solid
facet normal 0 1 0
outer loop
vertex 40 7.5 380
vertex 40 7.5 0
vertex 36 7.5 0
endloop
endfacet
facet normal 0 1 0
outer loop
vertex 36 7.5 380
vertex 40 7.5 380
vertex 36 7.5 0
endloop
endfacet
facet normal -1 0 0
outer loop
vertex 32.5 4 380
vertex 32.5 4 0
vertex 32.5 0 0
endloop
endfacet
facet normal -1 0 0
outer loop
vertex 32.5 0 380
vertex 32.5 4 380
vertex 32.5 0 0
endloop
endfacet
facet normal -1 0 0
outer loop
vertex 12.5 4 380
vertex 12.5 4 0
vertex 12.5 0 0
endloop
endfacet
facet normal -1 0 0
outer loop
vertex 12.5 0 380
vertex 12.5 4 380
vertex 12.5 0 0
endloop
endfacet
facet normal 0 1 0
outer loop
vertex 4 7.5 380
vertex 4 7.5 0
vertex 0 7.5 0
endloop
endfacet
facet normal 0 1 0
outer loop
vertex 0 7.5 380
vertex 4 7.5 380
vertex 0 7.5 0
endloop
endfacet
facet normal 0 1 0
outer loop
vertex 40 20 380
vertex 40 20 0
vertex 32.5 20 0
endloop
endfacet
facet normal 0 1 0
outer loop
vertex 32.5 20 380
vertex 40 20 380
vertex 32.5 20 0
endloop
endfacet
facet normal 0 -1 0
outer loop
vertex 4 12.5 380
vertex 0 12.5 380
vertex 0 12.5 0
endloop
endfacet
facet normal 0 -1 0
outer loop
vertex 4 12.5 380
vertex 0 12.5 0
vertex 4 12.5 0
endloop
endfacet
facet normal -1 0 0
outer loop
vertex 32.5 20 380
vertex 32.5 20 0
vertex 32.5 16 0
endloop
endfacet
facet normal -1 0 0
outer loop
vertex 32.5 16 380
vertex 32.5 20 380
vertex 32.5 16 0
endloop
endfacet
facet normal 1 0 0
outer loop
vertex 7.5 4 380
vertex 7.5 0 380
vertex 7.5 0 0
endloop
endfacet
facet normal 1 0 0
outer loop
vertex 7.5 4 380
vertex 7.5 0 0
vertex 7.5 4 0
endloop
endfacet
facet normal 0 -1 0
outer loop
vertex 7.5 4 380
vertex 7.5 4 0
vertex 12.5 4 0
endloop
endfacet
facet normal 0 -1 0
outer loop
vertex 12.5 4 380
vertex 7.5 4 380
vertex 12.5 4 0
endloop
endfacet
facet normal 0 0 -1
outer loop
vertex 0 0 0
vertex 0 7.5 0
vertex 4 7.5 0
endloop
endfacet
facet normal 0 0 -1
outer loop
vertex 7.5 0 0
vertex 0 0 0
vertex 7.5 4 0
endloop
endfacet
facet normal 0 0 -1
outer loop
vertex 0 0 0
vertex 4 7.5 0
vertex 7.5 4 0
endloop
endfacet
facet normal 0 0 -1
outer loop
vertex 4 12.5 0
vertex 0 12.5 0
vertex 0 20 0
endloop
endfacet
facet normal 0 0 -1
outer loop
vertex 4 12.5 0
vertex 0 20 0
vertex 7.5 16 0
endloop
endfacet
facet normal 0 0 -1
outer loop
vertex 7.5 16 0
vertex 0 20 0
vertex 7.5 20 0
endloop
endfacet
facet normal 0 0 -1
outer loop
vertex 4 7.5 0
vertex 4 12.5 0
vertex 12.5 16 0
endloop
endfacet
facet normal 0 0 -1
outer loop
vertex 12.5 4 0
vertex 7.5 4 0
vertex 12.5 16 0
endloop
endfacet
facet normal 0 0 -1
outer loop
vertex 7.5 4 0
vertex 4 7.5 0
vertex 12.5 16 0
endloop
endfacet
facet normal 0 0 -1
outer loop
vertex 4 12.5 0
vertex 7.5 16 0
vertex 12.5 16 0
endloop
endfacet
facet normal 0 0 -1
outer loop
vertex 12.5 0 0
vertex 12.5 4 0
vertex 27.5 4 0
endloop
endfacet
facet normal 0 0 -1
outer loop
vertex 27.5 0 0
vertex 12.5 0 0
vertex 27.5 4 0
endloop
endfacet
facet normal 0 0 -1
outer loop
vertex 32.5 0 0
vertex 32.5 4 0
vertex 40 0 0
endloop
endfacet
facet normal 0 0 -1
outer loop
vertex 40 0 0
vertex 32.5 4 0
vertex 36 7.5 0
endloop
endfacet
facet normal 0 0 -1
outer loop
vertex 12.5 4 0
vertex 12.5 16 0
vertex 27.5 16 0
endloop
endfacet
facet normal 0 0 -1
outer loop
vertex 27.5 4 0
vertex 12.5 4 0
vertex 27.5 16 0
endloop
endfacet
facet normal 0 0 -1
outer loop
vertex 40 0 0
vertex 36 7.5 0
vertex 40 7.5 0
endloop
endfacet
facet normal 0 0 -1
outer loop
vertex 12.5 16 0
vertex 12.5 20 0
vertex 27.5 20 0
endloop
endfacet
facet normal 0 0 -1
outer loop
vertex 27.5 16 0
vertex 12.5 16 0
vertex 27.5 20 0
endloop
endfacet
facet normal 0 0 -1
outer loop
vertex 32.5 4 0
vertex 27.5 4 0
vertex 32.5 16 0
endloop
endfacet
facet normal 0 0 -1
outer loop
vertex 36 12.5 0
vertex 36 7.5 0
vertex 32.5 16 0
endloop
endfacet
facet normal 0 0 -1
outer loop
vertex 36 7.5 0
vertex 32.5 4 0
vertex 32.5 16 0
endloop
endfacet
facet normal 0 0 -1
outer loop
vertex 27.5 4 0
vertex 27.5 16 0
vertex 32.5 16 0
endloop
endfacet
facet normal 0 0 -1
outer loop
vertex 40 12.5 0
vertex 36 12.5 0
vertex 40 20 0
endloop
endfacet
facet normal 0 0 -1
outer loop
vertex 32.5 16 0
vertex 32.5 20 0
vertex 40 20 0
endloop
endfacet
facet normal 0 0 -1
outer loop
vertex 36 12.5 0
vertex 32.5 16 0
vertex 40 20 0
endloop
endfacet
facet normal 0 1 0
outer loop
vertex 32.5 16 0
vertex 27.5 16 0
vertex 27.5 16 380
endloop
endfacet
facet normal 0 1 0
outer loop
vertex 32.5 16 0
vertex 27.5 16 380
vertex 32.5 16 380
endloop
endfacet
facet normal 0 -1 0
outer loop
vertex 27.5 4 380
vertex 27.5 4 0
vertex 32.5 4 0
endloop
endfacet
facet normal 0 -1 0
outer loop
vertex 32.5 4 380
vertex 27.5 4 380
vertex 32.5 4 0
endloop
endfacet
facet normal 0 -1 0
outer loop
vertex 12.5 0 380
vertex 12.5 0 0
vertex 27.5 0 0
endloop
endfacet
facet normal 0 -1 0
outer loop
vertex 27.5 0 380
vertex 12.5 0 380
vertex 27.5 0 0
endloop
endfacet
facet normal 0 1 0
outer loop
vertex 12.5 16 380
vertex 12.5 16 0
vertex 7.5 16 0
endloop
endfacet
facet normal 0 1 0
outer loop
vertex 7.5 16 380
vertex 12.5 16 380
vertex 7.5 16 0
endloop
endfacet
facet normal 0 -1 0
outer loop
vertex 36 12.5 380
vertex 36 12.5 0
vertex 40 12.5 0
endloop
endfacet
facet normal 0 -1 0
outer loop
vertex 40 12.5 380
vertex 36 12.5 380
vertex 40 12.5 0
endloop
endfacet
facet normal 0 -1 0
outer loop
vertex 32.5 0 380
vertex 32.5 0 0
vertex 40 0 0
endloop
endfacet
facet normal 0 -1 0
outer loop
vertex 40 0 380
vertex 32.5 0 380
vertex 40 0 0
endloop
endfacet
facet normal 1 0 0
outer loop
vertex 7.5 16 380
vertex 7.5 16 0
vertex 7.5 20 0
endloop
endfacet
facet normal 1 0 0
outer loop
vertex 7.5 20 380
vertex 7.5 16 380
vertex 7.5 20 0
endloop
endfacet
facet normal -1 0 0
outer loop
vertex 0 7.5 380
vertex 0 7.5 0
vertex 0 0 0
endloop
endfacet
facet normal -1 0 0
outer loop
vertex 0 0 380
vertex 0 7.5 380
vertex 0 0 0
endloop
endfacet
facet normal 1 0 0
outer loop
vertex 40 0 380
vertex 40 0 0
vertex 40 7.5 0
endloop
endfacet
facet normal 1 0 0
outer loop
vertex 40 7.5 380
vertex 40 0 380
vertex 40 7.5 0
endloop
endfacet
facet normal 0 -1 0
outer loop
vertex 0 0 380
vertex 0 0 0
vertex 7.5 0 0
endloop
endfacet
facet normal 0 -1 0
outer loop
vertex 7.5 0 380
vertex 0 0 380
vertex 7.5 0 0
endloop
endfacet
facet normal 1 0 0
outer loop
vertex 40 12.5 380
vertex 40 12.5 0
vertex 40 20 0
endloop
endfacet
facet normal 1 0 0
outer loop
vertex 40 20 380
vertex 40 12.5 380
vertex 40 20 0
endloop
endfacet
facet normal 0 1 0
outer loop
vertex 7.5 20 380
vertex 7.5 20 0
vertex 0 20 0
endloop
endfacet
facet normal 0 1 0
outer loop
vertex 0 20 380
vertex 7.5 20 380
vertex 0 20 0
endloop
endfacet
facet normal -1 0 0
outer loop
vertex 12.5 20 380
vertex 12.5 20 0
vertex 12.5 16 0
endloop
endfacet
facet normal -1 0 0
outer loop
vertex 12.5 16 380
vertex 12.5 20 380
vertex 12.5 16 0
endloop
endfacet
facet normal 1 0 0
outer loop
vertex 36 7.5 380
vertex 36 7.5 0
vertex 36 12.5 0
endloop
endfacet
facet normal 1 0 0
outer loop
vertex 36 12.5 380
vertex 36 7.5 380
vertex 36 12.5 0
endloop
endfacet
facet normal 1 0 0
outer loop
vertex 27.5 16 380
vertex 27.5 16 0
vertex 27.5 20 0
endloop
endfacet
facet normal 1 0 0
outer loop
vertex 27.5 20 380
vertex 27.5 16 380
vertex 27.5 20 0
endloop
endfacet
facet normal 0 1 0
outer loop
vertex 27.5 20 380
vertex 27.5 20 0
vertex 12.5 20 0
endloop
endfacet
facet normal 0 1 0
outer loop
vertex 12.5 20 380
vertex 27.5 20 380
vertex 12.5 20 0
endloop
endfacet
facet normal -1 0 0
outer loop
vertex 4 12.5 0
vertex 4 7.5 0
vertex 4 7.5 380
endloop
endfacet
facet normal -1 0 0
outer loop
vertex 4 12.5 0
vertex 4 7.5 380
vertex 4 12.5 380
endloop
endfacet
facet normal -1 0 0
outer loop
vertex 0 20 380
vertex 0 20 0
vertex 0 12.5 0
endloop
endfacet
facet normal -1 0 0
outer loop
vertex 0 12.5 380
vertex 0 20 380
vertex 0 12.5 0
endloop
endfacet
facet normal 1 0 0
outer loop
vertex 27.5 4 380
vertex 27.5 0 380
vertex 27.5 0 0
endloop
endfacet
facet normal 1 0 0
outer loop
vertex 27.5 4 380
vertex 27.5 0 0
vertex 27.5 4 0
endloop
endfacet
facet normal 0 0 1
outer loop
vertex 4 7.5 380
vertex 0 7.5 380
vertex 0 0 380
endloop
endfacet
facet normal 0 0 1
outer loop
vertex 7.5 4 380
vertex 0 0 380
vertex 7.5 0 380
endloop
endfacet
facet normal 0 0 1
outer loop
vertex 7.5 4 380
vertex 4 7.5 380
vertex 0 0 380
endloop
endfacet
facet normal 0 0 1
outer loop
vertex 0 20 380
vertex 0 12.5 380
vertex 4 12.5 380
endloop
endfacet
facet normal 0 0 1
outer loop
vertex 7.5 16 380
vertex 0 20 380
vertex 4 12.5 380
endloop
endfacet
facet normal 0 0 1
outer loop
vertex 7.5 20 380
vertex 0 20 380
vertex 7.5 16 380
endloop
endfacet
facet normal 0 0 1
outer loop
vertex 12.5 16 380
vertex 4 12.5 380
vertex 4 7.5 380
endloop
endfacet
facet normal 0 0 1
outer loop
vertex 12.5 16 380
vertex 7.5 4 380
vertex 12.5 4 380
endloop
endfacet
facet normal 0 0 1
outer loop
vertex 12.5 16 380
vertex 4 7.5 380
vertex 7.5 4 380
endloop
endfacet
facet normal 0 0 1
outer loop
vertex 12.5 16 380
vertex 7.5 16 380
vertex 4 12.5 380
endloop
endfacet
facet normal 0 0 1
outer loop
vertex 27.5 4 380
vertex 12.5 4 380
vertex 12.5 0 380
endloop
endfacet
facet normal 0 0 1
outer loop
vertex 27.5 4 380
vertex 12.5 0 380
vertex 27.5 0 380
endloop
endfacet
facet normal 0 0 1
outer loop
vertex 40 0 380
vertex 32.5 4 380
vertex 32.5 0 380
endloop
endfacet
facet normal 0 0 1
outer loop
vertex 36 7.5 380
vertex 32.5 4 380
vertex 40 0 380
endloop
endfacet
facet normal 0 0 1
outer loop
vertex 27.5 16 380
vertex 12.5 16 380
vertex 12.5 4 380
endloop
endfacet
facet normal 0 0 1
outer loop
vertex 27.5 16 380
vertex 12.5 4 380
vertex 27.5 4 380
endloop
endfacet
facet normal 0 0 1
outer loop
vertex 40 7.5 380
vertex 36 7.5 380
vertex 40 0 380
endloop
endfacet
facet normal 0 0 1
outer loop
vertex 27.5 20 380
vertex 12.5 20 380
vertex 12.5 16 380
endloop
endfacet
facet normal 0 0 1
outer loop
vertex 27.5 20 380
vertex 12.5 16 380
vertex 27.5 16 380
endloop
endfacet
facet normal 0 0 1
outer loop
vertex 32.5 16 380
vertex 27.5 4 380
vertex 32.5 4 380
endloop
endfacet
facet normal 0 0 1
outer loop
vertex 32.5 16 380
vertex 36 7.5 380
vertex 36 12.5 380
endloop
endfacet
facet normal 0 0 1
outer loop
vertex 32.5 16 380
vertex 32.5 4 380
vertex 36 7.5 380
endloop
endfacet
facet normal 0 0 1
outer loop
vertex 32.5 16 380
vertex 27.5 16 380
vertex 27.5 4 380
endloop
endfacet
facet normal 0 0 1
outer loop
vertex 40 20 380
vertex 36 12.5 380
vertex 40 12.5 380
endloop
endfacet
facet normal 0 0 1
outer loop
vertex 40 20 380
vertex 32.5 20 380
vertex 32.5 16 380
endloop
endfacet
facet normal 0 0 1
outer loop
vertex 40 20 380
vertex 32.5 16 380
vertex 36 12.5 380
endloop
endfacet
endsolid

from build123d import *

# Parameters (mm, degrees)
ESQUISSE1_W        = 3.5
ESQUISSE1_H        = 5
ESQUISSE1_W_2      = 5
ESQUISSE1_H_2      = 3.5
ESQUISSE1_W_3      = 4
BOSS_EXTRU_1_DEPTH = 380


with BuildPart() as part:
    # Esquisse1 → Boss.-Extru.1 (new body)
    with BuildSketch(Plane.XY):
        Polygon((7.5, 16), (7.5, 20), (0, 20), (4, 16), align=None)
        Polygon((4, 16), (0, 20), (0, 12.5), (4, 12.5), align=None)
        Polygon((4, 7.5), (0, 7.5), (0, 0), (4, 4), align=None)
        Polygon((0, 0), (7.5, 0), (7.5, 4), (4, 4), align=None)
        Polygon((4, 4), (7.5, 7.5), (4, 7.5), align=None)
        Polygon((7.5, 4), (7.5, 7.5), (4, 4), align=None)
        Polygon((4, 12.5), (7.5, 12.5), (4, 16), align=None)
        Polygon((7.5, 12.5), (7.5, 16), (4, 16), align=None)
        with Locations((5.75, 10)):
            Rectangle(ESQUISSE1_W, ESQUISSE1_H)
        Polygon((7.5, 7.5), (10, 10), (7.5, 12.5), align=None)
        Polygon((10, 10), (12.5, 12.5), (7.5, 12.5), align=None)
        Polygon((12.5, 7.5), (12.5, 12.5), (10, 10), align=None)
        Polygon((12.5, 7.5), (10, 10), (7.5, 7.5), align=None)
        Polygon((16, 4), (12.5, 7.5), (12.5, 4), align=None)
        Polygon((16, 4), (16, 7.5), (12.5, 7.5), align=None)
        Polygon((20, 0), (20, 7.5), (16, 7.5), (16, 4), align=None)
        with Locations((10, 14.25)):
            Rectangle(ESQUISSE1_W_2, ESQUISSE1_H_2)
        with Locations((14.25, 10)):
            Rectangle(ESQUISSE1_W, ESQUISSE1_H)
        Polygon((12.5, 12.5), (16, 16), (12.5, 16), align=None)
        Polygon((16, 16), (20, 20), (12.5, 20), (12.5, 16), align=None)
        Polygon((16, 12.5), (16, 16), (12.5, 12.5), align=None)
        Polygon((20, 12.5), (20, 20), (16, 16), (16, 12.5), align=None)
        Polygon((12.5, 0), (20, 0), (16, 4), (12.5, 4), align=None)
        with Locations((10, 5.75)):
            Rectangle(ESQUISSE1_W_2, ESQUISSE1_H_2)
        with Locations((18, 10)):
            Rectangle(ESQUISSE1_W_3, ESQUISSE1_H)
        with Locations((22, 10)):
            Rectangle(ESQUISSE1_W_3, ESQUISSE1_H)
        Polygon((24, 16), (20, 20), (20, 12.5), (24, 12.5), align=None)
        Polygon((27.5, 20), (20, 20), (24, 16), (27.5, 16), align=None)
        Polygon((27.5, 12.5), (24, 16), (24, 12.5), align=None)
        Polygon((27.5, 16), (24, 16), (27.5, 12.5), align=None)
        with Locations((25.75, 10)):
            Rectangle(ESQUISSE1_W, ESQUISSE1_H)
        Polygon((27.5, 7.5), (24, 7.5), (24, 4), align=None)
        Polygon((24, 7.5), (20, 7.5), (20, 0), (24, 4), align=None)
        Polygon((24, 4), (20, 0), (27.5, 0), (27.5, 4), align=None)
        Polygon((27.5, 4), (27.5, 7.5), (24, 4), align=None)
        with Locations((30, 5.75)):
            Rectangle(ESQUISSE1_W_2, ESQUISSE1_H_2)
        Polygon((36, 4), (32.5, 7.5), (32.5, 4), align=None)
        Polygon((36, 7.5), (32.5, 7.5), (36, 4), align=None)
        Polygon((40, 0), (40, 7.5), (36, 7.5), (36, 4), align=None)
        Polygon((32.5, 4), (32.5, 0), (40, 0), (36, 4), align=None)
        with Locations((34.25, 10)):
            Rectangle(ESQUISSE1_W, ESQUISSE1_H)
        Polygon((32.5, 12.5), (30, 10), (32.5, 7.5), align=None)
        Polygon((32.5, 7.5), (30, 10), (27.5, 7.5), align=None)
        Polygon((30, 10), (27.5, 12.5), (27.5, 7.5), align=None)
        Polygon((32.5, 12.5), (27.5, 12.5), (30, 10), align=None)
        Polygon((36, 16), (32.5, 12.5), (36, 12.5), align=None)
        Polygon((36, 16), (32.5, 16), (32.5, 12.5), align=None)
        Polygon((40, 20), (32.5, 20), (32.5, 16), (36, 16), align=None)
        Polygon((40, 12.5), (40, 20), (36, 16), (36, 12.5), align=None)
        with Locations((30, 14.25)):
            Rectangle(ESQUISSE1_W_2, ESQUISSE1_H_2)
    extrude(amount=BOSS_EXTRU_1_DEPTH)


solid = part.part
